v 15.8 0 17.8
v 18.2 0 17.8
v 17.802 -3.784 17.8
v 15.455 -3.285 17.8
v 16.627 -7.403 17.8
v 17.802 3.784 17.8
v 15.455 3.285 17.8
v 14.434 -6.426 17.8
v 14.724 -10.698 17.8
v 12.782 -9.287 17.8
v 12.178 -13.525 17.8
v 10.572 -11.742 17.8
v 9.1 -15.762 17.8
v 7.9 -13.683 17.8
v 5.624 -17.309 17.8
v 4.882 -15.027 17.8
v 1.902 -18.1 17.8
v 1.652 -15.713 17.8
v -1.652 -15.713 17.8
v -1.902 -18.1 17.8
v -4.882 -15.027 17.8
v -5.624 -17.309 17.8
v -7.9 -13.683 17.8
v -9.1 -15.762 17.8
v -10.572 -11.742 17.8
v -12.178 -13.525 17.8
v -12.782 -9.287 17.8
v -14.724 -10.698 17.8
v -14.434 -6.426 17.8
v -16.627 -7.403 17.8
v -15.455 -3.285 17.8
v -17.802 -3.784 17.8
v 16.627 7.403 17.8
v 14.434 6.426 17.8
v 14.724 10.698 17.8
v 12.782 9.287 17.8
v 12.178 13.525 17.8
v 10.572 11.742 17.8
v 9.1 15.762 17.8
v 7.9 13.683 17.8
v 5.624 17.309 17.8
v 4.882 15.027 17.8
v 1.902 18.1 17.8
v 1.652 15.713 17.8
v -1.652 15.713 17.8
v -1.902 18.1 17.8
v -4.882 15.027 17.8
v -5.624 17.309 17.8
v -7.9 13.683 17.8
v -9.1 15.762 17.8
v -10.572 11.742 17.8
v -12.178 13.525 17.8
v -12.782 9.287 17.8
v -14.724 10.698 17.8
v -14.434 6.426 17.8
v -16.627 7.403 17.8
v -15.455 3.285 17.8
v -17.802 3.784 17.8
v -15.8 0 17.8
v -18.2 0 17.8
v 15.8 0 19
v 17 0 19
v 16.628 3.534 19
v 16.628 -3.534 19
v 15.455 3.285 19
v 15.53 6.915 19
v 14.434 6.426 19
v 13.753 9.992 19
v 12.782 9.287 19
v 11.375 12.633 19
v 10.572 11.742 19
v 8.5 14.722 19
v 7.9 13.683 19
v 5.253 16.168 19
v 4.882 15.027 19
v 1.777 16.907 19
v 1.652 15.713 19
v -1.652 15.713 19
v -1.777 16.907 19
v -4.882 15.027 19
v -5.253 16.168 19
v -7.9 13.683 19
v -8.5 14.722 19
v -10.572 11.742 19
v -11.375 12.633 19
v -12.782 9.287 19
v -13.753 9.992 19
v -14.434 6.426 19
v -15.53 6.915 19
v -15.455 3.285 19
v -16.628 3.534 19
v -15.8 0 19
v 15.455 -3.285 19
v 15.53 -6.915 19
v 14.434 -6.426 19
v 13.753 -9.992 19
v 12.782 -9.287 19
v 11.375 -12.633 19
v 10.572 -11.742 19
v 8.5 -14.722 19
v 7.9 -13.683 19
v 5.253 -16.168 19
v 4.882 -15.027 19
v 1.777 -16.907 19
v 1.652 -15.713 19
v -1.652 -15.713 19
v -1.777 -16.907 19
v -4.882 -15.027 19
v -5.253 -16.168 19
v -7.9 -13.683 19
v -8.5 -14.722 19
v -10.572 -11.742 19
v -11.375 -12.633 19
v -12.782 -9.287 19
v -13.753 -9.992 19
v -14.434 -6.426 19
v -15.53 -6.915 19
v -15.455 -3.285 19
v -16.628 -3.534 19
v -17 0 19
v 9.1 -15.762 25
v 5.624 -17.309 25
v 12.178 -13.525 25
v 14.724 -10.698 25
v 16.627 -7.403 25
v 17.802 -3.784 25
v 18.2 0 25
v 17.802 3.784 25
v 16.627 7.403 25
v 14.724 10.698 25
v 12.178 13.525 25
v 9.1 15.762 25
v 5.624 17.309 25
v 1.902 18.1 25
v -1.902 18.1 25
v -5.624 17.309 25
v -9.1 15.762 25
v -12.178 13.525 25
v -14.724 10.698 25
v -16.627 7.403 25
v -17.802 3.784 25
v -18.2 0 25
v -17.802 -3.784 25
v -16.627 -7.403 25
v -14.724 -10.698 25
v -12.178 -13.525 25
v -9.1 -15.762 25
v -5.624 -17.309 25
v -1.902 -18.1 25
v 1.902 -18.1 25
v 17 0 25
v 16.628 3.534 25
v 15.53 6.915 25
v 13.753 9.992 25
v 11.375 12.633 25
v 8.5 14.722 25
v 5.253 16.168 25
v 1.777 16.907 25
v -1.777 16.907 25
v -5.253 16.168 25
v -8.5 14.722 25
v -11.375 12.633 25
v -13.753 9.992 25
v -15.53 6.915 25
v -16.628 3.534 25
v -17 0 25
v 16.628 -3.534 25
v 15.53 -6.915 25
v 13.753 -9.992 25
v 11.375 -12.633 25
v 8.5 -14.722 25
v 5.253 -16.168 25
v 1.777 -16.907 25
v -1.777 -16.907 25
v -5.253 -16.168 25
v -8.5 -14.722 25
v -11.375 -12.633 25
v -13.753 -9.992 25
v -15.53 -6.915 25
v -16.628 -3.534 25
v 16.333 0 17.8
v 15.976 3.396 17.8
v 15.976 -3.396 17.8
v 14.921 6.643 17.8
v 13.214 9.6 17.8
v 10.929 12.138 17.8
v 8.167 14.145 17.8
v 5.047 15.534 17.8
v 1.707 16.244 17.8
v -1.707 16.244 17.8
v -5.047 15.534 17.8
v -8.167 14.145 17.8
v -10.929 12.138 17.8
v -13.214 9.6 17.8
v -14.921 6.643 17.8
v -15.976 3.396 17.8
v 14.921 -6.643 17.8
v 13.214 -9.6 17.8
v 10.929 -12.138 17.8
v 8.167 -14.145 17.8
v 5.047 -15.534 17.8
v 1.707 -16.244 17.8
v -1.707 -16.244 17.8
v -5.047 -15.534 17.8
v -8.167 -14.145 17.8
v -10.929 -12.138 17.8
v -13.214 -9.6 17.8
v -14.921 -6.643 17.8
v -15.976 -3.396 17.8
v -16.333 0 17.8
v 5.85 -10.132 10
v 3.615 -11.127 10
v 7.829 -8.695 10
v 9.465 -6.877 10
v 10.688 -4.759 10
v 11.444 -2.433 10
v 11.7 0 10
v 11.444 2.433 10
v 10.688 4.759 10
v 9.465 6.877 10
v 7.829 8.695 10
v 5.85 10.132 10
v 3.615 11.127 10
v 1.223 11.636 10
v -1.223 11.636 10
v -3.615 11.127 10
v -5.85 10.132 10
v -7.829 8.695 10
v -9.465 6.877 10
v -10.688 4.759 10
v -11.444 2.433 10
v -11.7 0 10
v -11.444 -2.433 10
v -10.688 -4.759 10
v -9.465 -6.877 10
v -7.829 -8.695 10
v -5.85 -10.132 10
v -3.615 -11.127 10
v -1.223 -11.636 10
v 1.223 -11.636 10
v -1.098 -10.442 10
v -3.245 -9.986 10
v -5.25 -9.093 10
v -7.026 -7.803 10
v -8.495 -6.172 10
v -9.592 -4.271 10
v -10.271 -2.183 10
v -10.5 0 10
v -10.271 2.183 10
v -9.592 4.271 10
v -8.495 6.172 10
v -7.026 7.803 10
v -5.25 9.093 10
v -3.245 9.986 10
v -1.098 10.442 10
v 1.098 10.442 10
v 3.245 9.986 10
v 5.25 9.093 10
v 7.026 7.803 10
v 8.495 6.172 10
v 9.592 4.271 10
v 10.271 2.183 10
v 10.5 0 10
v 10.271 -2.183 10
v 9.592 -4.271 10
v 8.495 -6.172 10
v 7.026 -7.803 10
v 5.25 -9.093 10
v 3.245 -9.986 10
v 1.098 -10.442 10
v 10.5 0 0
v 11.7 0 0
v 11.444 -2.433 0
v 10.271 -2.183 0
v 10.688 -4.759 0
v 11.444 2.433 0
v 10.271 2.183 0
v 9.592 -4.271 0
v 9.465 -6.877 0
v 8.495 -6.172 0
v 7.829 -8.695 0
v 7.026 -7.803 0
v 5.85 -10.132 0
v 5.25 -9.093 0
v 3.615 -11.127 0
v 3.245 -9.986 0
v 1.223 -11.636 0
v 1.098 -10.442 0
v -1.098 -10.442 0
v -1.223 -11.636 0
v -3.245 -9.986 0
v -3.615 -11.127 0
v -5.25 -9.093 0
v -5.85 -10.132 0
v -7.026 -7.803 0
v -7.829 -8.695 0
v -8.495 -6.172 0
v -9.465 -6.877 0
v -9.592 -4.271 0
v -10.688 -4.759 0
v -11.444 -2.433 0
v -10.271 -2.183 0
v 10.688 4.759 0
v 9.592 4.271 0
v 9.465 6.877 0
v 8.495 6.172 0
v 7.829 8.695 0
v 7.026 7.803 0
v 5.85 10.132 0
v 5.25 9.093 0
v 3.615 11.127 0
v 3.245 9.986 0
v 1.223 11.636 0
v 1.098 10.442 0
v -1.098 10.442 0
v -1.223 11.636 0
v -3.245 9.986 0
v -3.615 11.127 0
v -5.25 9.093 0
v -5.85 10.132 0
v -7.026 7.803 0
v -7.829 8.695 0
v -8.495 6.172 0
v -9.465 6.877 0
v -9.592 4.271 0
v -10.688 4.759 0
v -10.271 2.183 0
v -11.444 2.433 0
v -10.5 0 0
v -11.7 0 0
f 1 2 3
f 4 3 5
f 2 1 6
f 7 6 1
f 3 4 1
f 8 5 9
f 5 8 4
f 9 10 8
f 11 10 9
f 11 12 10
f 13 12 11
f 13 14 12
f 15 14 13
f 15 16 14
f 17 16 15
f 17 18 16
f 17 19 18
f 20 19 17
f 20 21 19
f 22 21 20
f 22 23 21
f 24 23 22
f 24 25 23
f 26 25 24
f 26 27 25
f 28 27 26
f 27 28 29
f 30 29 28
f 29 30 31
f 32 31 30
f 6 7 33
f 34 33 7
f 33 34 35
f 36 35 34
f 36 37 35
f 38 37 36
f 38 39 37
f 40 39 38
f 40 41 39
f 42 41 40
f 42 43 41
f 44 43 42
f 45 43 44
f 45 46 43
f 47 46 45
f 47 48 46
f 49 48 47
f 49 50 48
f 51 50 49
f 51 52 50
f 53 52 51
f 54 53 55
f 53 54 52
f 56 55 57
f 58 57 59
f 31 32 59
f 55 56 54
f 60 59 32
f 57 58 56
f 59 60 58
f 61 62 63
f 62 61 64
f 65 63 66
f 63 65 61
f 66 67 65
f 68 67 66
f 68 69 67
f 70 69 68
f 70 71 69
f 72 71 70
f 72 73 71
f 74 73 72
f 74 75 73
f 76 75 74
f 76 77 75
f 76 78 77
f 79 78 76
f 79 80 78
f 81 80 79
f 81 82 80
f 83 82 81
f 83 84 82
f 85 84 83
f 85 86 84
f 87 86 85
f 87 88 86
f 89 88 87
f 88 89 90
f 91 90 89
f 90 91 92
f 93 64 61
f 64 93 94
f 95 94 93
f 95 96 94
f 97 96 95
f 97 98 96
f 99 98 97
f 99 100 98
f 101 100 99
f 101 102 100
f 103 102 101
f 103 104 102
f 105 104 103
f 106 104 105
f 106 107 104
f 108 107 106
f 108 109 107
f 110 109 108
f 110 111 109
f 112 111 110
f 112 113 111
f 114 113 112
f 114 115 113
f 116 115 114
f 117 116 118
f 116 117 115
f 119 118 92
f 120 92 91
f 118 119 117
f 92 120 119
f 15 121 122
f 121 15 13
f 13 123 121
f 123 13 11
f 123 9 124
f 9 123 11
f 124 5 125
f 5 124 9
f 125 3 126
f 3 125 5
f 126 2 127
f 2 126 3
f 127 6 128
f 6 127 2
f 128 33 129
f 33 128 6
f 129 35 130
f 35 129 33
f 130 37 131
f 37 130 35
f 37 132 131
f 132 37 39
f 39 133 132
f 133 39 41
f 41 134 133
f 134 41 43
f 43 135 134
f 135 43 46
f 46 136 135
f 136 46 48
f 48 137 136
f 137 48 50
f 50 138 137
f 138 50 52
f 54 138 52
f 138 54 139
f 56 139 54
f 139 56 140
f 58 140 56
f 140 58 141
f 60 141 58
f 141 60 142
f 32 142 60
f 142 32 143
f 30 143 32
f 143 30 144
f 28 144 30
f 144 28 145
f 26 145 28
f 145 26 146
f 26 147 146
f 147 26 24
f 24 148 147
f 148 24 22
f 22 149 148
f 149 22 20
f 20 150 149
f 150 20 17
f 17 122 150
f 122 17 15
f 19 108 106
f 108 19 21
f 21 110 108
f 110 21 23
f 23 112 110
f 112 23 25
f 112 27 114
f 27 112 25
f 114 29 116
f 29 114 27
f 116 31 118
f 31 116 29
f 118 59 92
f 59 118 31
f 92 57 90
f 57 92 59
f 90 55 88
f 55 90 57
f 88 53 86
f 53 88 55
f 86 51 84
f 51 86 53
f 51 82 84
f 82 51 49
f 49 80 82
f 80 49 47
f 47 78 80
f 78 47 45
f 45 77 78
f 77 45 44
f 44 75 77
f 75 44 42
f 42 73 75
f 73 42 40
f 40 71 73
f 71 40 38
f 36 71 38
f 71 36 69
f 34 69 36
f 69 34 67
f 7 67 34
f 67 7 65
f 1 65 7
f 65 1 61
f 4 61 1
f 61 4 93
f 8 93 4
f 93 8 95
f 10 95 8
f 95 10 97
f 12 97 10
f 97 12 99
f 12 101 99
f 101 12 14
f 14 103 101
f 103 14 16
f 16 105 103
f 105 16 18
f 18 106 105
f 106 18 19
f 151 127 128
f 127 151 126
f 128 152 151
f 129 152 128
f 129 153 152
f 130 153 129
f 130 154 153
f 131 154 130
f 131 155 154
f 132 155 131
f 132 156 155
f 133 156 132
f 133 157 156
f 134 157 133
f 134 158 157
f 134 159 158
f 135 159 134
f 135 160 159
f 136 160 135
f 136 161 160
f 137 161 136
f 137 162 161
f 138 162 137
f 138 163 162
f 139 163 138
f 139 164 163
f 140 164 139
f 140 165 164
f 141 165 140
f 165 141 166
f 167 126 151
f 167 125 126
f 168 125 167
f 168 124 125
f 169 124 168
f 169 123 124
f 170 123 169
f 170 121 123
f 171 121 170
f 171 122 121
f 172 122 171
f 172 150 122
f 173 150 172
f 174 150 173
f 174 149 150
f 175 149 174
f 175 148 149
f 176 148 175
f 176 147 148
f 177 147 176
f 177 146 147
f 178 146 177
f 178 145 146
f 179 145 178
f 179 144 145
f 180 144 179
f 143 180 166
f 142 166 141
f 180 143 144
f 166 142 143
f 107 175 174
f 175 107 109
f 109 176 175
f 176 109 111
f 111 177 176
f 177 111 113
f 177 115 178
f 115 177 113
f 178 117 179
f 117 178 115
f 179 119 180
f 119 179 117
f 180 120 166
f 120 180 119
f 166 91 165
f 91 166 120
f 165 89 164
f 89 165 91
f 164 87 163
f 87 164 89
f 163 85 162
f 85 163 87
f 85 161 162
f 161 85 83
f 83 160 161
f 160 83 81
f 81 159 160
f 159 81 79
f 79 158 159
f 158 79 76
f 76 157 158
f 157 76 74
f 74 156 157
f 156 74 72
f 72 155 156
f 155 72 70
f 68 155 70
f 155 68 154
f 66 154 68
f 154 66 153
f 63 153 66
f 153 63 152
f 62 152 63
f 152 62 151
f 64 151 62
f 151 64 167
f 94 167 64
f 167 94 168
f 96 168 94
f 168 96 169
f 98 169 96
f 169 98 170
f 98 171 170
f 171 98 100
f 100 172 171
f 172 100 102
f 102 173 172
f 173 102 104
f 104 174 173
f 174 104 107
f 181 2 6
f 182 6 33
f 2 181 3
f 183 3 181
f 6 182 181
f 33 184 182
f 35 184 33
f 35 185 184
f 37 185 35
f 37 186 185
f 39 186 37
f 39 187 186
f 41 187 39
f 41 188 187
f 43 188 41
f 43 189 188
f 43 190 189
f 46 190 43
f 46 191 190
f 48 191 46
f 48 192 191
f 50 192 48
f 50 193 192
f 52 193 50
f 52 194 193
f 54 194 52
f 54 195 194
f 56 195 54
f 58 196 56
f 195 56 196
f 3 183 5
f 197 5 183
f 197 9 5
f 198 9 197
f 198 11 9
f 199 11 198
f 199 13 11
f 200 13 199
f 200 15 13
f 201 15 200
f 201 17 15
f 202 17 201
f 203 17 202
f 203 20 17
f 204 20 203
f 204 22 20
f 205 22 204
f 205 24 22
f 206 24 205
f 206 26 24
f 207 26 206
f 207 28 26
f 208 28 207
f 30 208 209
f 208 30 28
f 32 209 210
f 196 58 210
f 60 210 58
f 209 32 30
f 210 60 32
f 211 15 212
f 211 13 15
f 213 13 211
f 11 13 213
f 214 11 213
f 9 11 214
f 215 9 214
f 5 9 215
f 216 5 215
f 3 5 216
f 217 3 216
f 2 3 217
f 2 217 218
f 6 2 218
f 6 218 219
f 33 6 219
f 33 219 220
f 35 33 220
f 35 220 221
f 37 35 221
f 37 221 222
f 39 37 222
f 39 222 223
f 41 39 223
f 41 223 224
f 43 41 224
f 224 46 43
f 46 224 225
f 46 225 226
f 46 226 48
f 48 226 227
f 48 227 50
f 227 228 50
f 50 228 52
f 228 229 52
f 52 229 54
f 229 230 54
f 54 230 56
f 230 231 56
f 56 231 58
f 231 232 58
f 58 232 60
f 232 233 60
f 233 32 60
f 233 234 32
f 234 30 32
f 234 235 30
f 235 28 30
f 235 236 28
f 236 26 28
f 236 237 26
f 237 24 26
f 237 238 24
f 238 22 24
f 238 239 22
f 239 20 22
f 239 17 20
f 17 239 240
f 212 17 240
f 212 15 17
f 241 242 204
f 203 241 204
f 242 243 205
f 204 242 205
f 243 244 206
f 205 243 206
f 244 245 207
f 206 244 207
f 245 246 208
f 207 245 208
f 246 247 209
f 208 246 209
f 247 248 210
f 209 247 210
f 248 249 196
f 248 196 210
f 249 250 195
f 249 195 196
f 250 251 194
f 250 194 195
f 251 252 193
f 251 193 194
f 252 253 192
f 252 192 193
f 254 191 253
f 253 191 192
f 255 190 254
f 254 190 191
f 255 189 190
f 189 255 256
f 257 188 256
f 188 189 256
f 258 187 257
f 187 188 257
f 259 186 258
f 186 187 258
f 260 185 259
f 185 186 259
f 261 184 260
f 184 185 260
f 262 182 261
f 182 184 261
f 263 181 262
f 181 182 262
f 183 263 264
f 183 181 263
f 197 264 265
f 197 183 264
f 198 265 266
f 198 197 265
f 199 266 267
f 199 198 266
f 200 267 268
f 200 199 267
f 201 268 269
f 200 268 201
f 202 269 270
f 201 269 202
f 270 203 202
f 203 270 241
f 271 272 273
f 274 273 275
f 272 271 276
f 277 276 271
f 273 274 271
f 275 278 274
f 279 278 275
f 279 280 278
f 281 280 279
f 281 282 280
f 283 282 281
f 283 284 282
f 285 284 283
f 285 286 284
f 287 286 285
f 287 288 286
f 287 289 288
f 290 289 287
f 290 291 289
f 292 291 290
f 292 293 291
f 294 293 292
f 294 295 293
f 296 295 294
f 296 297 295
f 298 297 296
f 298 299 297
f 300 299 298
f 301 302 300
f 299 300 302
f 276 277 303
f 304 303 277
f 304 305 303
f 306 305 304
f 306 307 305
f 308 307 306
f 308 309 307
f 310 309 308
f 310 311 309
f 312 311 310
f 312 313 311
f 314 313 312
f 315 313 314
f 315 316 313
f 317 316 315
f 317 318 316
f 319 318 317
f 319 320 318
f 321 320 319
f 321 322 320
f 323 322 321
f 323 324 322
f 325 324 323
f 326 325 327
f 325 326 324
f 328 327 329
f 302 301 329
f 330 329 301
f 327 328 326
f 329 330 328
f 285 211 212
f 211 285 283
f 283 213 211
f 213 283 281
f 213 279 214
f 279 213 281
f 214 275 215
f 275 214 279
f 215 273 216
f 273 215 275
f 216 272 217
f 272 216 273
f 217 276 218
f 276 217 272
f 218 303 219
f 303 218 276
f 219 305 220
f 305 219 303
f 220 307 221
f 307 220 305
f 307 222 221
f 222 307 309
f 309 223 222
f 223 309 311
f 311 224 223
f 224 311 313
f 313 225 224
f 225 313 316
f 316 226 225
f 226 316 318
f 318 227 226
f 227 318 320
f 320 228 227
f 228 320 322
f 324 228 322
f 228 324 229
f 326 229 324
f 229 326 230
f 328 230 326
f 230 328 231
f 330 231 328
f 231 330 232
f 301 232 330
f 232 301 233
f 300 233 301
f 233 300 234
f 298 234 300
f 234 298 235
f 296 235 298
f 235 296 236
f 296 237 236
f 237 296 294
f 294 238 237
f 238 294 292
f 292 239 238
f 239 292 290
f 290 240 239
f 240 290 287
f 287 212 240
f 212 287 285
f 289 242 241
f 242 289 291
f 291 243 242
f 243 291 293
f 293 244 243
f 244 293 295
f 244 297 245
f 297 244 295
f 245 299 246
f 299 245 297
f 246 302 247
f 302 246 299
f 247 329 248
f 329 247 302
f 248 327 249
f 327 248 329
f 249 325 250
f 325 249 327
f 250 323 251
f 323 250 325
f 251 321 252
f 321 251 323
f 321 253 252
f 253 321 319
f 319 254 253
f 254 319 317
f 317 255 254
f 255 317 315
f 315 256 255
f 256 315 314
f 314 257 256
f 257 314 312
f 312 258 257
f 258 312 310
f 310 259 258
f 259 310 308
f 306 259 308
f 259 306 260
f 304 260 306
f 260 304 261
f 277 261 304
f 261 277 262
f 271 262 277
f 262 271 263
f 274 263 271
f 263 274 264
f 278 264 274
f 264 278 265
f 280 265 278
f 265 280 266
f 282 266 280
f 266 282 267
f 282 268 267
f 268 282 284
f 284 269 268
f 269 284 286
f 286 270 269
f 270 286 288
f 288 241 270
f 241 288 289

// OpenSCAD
filter_height = 6;
wall_thickness = 1.2;
lens_radius = 17;
camera_radius = 10.5;
camera_base_height = 10;

connection_height = (lens_radius - camera_radius) * 1.2;
echo("total camera clearance: ", camera_base_height + connection_height);

base(camera_radius, wall_thickness, camera_base_height);

translate([0, 0, camera_base_height]) {
    linear_extrude(
            height = connection_height,
            scale = (lens_radius + wall_thickness) / (camera_radius + wall_thickness)
    )ring(camera_radius, wall_thickness);

    translate([0, 0, connection_height])
        lens_holder(lens_radius, wall_thickness, filter_height);
}
module lens_holder(
    lens_radius,
    wall_thickness,
    filter_height
) {
    
    linear_extrude(height = wall_thickness)
        ring(lens_radius - wall_thickness , wall_thickness * 2);
    translate([0, 0, wall_thickness])
        linear_extrude(height = filter_height)
            ring(lens_radius, wall_thickness);
}

module ring(inner_radius, wall_thickness) {
    difference() {
        circle(inner_radius + wall_thickness);
        circle(inner_radius);
    }
}

module base(camera_radius, wall_thickness, camera_base_height) {
    linear_extrude(height = camera_base_height)
        ring(camera_radius, wall_thickness);
}
